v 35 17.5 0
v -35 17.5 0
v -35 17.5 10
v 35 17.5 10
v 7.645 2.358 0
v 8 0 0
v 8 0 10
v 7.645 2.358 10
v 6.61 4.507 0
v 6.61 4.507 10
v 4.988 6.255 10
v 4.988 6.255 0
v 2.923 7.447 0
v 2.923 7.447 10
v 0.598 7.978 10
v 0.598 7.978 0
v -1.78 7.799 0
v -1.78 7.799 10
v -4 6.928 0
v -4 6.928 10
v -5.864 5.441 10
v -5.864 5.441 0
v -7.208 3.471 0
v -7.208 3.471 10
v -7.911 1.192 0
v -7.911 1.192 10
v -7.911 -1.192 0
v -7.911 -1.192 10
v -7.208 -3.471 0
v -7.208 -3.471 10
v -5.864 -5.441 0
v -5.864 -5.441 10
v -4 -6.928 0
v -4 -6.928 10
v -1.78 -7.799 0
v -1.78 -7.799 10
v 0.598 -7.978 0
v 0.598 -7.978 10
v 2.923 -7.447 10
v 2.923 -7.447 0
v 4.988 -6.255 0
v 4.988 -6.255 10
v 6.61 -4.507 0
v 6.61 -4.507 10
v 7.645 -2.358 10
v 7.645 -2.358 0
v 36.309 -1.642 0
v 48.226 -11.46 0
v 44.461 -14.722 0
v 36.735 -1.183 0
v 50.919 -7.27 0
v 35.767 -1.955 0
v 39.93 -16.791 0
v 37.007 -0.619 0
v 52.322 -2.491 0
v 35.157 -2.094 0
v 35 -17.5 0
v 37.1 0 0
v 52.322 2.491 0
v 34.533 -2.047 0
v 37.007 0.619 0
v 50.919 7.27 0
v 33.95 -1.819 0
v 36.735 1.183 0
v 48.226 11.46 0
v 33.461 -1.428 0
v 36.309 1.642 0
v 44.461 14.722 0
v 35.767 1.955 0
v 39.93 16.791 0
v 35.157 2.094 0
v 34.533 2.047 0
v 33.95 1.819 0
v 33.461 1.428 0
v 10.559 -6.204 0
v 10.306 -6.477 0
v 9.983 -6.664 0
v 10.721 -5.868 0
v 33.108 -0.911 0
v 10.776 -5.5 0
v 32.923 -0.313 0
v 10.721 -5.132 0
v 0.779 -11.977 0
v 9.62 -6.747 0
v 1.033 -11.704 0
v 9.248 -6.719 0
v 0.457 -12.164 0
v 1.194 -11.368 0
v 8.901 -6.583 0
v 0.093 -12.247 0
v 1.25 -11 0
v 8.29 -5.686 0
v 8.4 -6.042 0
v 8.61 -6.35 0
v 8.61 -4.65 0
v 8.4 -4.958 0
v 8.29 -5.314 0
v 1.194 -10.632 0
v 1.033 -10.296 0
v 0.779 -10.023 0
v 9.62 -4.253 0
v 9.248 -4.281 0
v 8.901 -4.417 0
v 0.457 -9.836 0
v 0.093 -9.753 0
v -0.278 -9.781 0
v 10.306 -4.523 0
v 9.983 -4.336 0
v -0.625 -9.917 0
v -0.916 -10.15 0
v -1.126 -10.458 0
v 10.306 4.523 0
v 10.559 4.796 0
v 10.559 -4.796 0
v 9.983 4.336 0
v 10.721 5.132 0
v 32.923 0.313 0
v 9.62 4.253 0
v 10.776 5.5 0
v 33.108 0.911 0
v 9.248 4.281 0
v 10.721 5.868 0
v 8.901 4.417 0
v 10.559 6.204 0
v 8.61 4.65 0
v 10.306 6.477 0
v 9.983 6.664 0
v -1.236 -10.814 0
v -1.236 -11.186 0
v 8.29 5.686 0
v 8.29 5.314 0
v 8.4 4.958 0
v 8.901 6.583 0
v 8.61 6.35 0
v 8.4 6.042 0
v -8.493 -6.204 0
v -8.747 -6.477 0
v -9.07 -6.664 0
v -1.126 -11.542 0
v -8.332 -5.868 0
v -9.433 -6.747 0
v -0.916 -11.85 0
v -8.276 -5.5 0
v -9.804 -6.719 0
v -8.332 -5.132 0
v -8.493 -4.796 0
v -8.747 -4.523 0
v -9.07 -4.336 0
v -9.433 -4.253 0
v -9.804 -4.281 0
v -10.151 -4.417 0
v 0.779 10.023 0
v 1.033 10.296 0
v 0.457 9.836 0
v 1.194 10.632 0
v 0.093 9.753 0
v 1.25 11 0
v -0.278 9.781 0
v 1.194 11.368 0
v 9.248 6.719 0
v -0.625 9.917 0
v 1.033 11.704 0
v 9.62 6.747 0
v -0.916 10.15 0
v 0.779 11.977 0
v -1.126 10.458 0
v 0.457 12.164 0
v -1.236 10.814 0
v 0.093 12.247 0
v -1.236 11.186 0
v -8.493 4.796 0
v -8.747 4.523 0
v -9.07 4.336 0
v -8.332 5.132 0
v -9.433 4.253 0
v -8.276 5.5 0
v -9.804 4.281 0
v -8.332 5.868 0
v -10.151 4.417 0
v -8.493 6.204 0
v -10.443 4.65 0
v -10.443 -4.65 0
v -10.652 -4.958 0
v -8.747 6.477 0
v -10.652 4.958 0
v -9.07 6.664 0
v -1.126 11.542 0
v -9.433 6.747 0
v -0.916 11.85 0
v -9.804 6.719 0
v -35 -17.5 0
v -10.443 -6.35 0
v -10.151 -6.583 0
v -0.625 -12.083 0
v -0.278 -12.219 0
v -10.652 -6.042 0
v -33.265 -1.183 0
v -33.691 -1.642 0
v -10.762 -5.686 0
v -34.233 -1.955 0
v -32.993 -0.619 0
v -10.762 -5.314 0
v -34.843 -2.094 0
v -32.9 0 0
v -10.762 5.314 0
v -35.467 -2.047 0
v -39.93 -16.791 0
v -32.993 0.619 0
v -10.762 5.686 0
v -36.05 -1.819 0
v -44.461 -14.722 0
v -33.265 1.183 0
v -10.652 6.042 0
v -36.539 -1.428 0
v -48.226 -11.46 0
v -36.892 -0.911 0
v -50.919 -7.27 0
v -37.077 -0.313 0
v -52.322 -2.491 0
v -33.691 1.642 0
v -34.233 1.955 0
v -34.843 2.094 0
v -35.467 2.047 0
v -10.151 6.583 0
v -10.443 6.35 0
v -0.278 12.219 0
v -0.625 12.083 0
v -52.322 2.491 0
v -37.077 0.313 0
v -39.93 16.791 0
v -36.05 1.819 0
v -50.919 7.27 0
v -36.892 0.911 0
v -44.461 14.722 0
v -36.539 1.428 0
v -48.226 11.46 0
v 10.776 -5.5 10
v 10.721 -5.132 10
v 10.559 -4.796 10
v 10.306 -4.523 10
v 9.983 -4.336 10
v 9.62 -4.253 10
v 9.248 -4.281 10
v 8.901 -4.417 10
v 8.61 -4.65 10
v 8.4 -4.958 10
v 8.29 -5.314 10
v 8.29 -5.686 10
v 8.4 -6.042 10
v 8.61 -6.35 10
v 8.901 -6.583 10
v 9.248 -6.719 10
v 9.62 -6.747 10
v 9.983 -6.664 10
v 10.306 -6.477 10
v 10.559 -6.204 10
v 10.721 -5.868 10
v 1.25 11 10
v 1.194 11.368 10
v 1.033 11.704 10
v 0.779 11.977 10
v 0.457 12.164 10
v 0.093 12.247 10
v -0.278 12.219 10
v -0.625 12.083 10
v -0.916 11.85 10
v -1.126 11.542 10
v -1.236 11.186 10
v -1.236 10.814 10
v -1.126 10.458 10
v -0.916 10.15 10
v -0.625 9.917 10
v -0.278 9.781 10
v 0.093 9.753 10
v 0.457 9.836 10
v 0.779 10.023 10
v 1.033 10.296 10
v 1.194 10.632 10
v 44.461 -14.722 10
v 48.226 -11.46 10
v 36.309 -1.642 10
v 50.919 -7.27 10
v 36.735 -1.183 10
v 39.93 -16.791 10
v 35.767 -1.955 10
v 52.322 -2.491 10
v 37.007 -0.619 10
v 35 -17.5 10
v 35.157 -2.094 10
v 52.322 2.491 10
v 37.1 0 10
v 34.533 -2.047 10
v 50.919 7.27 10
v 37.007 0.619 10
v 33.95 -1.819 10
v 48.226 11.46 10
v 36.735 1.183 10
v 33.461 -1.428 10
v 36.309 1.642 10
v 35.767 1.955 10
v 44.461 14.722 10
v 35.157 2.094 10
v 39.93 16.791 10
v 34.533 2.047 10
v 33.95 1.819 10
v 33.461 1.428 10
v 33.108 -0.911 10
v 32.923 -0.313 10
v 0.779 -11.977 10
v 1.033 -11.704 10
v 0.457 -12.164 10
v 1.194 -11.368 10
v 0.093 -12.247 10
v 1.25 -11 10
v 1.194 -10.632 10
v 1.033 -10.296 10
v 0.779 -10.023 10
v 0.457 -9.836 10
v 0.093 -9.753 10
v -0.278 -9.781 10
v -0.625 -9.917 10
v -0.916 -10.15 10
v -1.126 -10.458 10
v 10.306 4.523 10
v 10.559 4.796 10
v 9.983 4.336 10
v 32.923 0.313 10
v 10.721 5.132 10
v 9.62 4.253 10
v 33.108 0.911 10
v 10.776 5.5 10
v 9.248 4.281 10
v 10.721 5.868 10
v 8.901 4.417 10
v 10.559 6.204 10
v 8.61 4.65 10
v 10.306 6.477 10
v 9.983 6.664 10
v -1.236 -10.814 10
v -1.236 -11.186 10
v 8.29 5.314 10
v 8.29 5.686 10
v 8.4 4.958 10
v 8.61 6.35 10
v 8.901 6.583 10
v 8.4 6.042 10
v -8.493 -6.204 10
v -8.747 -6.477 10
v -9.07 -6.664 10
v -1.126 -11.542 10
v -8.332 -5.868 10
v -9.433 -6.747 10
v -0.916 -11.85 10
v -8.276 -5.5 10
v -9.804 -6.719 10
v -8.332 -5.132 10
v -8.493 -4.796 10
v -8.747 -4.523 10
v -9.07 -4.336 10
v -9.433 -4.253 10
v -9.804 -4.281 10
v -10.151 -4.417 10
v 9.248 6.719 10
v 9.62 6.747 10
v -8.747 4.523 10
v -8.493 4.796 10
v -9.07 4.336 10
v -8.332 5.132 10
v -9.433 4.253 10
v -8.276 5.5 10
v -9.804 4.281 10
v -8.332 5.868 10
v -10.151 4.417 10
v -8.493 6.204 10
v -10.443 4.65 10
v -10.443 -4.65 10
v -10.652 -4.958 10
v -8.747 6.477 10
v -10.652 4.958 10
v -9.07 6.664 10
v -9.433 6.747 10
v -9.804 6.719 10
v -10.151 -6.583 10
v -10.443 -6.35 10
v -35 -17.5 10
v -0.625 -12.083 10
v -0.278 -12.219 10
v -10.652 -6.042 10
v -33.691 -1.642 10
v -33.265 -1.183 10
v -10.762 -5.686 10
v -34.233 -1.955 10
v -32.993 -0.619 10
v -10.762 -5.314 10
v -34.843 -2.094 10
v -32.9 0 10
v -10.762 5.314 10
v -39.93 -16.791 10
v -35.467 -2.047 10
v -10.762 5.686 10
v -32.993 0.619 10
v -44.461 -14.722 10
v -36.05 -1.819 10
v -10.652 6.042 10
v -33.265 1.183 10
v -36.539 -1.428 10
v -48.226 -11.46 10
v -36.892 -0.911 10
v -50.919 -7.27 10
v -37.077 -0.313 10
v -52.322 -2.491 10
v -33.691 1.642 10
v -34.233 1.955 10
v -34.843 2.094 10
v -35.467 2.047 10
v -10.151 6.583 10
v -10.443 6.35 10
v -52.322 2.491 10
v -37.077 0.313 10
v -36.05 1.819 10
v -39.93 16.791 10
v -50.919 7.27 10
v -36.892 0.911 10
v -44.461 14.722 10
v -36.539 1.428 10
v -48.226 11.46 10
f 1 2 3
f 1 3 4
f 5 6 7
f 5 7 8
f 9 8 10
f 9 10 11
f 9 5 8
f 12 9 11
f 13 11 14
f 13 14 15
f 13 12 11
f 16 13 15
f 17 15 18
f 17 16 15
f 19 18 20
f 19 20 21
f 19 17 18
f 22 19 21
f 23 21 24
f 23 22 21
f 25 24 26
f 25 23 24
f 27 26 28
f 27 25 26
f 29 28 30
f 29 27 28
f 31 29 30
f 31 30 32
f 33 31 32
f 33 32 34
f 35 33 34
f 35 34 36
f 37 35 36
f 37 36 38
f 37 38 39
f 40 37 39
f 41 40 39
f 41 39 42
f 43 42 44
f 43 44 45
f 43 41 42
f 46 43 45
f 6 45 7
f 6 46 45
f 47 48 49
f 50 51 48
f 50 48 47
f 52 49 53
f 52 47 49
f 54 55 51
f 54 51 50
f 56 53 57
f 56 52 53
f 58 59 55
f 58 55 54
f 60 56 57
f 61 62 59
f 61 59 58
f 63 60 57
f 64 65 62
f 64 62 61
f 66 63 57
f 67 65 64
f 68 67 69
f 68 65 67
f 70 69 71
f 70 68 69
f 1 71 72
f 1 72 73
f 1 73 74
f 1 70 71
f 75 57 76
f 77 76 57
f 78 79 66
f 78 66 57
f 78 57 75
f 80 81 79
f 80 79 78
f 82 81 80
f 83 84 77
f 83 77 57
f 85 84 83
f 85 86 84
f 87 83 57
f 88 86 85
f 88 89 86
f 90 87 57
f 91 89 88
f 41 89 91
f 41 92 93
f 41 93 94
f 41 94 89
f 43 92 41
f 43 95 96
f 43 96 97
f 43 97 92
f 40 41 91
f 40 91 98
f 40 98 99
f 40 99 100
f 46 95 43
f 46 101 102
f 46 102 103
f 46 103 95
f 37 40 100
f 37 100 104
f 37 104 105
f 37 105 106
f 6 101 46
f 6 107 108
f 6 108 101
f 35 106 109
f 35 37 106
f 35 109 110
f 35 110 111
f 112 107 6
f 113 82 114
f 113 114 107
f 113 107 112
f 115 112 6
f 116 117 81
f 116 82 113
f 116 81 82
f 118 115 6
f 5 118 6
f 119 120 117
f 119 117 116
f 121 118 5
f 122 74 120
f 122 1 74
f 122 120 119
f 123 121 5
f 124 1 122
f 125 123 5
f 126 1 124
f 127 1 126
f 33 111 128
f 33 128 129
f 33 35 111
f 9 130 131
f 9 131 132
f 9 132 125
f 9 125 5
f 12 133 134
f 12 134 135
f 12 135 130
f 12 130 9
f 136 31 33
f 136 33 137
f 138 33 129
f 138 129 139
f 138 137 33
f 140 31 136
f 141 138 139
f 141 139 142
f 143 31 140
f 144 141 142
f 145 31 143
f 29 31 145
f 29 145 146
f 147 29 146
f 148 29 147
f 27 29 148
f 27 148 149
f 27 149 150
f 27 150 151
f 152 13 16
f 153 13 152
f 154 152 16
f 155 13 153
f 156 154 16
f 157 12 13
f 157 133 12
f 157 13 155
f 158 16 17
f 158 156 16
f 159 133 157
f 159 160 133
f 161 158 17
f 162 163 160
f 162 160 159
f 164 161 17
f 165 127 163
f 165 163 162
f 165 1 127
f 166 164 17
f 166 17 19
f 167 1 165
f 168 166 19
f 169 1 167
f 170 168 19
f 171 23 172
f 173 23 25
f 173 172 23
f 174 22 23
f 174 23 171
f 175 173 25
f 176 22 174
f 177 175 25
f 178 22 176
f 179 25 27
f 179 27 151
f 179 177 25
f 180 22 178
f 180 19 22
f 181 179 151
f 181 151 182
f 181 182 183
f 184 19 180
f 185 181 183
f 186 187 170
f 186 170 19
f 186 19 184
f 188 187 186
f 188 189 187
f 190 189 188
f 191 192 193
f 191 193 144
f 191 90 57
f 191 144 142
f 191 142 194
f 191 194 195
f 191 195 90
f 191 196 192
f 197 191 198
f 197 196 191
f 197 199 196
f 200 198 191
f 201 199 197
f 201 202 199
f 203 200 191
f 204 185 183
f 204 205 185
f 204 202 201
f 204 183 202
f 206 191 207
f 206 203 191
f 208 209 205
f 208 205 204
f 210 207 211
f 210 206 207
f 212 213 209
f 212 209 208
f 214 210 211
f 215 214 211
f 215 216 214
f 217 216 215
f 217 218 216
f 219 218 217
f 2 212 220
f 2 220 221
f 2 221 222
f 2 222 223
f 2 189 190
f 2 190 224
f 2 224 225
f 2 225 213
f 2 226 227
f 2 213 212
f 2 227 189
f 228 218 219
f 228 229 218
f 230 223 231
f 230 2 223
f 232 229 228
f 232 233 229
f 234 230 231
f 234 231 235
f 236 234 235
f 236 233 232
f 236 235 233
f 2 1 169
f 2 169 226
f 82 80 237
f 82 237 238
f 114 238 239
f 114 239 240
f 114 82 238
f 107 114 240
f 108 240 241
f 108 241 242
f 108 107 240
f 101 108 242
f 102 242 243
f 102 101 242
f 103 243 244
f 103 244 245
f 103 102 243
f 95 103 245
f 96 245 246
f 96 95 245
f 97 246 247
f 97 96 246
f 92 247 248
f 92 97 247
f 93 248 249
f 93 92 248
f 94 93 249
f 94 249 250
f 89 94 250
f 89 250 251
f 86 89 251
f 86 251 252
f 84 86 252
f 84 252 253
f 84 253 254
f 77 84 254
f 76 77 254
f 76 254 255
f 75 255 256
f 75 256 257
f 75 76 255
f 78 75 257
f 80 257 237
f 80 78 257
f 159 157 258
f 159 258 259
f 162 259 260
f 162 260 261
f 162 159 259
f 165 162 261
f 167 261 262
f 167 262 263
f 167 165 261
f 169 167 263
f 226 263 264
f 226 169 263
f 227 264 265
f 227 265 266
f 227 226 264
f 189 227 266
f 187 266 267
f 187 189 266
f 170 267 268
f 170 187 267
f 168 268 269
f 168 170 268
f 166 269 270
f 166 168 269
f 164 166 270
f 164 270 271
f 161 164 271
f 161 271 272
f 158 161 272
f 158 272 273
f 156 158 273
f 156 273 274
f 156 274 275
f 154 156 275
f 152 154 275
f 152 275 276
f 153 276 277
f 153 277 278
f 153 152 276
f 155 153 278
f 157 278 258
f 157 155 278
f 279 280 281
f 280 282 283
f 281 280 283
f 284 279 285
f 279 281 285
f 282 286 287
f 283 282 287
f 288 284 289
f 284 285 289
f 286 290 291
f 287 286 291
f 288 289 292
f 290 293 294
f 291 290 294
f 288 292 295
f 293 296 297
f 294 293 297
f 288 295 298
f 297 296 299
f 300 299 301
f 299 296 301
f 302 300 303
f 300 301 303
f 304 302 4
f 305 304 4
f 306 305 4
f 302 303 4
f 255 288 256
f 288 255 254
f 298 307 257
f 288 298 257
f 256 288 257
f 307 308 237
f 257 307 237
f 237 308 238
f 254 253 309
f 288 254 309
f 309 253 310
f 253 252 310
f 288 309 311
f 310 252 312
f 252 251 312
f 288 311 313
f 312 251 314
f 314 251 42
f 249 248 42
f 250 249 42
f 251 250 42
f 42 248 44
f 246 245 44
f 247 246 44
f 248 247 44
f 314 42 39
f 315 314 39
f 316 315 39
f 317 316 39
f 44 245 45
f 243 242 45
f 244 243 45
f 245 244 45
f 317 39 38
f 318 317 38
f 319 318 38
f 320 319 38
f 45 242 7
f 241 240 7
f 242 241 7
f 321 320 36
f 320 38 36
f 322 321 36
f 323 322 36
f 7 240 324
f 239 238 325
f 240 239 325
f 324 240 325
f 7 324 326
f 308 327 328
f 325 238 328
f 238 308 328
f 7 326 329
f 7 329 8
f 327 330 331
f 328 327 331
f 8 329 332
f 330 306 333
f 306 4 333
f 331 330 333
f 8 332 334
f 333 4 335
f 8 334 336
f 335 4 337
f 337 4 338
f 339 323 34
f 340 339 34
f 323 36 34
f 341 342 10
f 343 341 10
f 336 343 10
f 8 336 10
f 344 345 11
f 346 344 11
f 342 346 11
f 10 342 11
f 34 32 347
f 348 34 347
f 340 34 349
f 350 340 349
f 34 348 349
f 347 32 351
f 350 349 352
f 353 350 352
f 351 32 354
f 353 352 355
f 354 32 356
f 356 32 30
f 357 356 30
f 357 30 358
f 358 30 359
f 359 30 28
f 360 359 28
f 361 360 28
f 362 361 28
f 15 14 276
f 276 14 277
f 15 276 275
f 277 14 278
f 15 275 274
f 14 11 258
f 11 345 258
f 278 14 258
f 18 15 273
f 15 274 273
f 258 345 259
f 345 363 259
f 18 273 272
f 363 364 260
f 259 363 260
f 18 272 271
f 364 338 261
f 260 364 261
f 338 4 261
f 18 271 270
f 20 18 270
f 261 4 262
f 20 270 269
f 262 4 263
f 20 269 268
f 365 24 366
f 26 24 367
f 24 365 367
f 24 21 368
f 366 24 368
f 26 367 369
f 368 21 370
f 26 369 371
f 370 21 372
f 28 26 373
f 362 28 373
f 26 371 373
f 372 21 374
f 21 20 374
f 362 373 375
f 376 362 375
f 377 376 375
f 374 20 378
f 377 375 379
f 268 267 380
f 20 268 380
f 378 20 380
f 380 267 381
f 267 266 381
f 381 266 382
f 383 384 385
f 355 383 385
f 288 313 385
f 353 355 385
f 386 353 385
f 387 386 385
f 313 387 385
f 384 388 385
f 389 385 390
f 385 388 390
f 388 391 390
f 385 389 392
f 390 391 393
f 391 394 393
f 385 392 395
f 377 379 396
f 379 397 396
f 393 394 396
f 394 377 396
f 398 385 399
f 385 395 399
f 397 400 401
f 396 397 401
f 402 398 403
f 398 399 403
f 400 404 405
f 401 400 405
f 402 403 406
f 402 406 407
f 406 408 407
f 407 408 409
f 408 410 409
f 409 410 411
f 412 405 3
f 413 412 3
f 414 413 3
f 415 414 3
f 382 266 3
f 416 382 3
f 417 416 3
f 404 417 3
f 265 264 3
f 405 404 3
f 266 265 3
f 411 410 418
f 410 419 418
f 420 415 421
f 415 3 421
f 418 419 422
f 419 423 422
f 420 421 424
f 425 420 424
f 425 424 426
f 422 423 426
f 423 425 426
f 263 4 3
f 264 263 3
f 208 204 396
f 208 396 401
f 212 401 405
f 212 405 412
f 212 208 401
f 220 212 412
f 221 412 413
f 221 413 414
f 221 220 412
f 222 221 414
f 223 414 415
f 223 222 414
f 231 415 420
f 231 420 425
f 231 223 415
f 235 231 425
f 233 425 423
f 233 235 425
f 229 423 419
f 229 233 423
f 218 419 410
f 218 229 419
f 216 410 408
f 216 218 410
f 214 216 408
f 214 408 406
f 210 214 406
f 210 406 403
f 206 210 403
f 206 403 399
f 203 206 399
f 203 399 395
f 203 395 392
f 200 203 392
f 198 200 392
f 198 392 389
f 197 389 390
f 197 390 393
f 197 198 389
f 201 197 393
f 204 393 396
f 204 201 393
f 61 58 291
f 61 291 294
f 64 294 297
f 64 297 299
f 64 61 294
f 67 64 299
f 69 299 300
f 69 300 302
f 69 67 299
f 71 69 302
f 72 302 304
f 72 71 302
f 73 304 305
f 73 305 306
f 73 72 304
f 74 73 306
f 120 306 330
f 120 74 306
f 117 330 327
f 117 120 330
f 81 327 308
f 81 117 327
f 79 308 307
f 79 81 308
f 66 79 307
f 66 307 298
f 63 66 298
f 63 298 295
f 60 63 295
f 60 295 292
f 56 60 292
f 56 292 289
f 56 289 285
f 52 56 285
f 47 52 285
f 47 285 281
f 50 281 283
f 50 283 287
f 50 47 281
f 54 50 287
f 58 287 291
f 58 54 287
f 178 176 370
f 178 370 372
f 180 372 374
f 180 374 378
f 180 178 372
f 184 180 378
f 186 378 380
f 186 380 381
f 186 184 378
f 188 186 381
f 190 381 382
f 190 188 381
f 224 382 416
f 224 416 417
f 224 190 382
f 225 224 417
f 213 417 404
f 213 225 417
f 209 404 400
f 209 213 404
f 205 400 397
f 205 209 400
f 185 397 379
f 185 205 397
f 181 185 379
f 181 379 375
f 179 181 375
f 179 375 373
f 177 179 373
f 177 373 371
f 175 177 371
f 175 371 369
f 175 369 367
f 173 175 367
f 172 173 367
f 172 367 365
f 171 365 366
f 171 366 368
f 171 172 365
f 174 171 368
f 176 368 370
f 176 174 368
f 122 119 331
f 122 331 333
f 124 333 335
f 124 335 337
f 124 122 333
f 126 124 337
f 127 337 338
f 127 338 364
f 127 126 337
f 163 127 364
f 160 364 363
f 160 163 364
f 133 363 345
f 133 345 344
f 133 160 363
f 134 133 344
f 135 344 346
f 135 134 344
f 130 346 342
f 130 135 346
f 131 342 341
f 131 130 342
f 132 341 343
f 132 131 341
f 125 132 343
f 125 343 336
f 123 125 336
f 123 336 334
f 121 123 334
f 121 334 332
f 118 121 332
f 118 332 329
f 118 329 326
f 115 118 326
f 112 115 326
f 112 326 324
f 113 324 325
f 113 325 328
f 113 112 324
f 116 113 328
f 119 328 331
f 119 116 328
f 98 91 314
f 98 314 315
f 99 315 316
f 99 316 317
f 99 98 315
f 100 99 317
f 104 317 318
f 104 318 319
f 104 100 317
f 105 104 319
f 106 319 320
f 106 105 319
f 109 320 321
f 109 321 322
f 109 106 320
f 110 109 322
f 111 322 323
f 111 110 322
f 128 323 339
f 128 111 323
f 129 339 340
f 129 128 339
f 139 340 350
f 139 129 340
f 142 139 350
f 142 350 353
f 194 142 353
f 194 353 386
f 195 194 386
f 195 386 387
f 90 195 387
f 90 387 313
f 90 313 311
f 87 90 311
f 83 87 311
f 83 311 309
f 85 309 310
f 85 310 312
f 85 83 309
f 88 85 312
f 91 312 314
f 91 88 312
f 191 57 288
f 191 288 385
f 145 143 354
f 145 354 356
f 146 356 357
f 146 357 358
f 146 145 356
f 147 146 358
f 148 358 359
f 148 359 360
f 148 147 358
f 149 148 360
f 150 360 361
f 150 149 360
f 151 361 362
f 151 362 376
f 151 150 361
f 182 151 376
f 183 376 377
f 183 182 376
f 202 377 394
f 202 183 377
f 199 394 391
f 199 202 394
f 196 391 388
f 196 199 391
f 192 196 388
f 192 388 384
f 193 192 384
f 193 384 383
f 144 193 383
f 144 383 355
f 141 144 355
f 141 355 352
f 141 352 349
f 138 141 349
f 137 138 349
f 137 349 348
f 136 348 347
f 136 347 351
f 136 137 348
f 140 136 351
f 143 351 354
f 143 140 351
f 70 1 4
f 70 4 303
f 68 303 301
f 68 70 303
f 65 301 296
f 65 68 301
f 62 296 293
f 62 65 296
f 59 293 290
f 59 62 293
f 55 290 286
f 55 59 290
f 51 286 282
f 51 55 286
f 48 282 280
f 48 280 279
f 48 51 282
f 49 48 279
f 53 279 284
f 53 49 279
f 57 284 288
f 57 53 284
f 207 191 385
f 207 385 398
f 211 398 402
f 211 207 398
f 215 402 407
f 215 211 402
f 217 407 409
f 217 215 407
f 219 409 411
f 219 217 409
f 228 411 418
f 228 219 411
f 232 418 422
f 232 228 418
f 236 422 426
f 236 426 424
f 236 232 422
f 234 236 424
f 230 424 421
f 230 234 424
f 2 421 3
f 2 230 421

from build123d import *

# Parameters (mm, degrees)
IZIM1_R                     = 8
IZIM1_R_2                   = 2.1
IZIM1_R_3                   = 1.25
Y_KSEKLIK_EKSTR_ZYON1_DEPTH = 10


with BuildPart() as part:
    # Çizim1 → Yükseklik-Ekstrüzyon1 (new body)
    with BuildSketch(Plane.XY):
        with BuildLine():
            Line((-35, 17.5), (35, 17.5))
            ThreePointArc((35, 17.5), (52.5, 0), (35, -17.5))
            Line((35, -17.5), (-35, -17.5))
            ThreePointArc((-35, -17.5), (-52.5, 0), (-35, 17.5))
        make_face()
        Circle(IZIM1_R, mode=Mode.SUBTRACT)
        with Locations((-35, 0)):
            Circle(IZIM1_R_2, mode=Mode.SUBTRACT)
        with Locations((0, 11)):
            Circle(IZIM1_R_3, mode=Mode.SUBTRACT)
        with Locations((9.526279442, 5.5)):
            Circle(IZIM1_R_3, mode=Mode.SUBTRACT)
        with Locations((9.526279442, -5.5)):
            Circle(IZIM1_R_3, mode=Mode.SUBTRACT)
        with Locations((0, -11)):
            Circle(IZIM1_R_3, mode=Mode.SUBTRACT)
        with Locations((-9.526279442, -5.5)):
            Circle(IZIM1_R_3, mode=Mode.SUBTRACT)
        with Locations((-9.526279442, 5.5)):
            Circle(IZIM1_R_3, mode=Mode.SUBTRACT)
        with Locations((35, 0)):
            Circle(IZIM1_R_2, mode=Mode.SUBTRACT)
    extrude(amount=Y_KSEKLIK_EKSTR_ZYON1_DEPTH)


solid = part.part
